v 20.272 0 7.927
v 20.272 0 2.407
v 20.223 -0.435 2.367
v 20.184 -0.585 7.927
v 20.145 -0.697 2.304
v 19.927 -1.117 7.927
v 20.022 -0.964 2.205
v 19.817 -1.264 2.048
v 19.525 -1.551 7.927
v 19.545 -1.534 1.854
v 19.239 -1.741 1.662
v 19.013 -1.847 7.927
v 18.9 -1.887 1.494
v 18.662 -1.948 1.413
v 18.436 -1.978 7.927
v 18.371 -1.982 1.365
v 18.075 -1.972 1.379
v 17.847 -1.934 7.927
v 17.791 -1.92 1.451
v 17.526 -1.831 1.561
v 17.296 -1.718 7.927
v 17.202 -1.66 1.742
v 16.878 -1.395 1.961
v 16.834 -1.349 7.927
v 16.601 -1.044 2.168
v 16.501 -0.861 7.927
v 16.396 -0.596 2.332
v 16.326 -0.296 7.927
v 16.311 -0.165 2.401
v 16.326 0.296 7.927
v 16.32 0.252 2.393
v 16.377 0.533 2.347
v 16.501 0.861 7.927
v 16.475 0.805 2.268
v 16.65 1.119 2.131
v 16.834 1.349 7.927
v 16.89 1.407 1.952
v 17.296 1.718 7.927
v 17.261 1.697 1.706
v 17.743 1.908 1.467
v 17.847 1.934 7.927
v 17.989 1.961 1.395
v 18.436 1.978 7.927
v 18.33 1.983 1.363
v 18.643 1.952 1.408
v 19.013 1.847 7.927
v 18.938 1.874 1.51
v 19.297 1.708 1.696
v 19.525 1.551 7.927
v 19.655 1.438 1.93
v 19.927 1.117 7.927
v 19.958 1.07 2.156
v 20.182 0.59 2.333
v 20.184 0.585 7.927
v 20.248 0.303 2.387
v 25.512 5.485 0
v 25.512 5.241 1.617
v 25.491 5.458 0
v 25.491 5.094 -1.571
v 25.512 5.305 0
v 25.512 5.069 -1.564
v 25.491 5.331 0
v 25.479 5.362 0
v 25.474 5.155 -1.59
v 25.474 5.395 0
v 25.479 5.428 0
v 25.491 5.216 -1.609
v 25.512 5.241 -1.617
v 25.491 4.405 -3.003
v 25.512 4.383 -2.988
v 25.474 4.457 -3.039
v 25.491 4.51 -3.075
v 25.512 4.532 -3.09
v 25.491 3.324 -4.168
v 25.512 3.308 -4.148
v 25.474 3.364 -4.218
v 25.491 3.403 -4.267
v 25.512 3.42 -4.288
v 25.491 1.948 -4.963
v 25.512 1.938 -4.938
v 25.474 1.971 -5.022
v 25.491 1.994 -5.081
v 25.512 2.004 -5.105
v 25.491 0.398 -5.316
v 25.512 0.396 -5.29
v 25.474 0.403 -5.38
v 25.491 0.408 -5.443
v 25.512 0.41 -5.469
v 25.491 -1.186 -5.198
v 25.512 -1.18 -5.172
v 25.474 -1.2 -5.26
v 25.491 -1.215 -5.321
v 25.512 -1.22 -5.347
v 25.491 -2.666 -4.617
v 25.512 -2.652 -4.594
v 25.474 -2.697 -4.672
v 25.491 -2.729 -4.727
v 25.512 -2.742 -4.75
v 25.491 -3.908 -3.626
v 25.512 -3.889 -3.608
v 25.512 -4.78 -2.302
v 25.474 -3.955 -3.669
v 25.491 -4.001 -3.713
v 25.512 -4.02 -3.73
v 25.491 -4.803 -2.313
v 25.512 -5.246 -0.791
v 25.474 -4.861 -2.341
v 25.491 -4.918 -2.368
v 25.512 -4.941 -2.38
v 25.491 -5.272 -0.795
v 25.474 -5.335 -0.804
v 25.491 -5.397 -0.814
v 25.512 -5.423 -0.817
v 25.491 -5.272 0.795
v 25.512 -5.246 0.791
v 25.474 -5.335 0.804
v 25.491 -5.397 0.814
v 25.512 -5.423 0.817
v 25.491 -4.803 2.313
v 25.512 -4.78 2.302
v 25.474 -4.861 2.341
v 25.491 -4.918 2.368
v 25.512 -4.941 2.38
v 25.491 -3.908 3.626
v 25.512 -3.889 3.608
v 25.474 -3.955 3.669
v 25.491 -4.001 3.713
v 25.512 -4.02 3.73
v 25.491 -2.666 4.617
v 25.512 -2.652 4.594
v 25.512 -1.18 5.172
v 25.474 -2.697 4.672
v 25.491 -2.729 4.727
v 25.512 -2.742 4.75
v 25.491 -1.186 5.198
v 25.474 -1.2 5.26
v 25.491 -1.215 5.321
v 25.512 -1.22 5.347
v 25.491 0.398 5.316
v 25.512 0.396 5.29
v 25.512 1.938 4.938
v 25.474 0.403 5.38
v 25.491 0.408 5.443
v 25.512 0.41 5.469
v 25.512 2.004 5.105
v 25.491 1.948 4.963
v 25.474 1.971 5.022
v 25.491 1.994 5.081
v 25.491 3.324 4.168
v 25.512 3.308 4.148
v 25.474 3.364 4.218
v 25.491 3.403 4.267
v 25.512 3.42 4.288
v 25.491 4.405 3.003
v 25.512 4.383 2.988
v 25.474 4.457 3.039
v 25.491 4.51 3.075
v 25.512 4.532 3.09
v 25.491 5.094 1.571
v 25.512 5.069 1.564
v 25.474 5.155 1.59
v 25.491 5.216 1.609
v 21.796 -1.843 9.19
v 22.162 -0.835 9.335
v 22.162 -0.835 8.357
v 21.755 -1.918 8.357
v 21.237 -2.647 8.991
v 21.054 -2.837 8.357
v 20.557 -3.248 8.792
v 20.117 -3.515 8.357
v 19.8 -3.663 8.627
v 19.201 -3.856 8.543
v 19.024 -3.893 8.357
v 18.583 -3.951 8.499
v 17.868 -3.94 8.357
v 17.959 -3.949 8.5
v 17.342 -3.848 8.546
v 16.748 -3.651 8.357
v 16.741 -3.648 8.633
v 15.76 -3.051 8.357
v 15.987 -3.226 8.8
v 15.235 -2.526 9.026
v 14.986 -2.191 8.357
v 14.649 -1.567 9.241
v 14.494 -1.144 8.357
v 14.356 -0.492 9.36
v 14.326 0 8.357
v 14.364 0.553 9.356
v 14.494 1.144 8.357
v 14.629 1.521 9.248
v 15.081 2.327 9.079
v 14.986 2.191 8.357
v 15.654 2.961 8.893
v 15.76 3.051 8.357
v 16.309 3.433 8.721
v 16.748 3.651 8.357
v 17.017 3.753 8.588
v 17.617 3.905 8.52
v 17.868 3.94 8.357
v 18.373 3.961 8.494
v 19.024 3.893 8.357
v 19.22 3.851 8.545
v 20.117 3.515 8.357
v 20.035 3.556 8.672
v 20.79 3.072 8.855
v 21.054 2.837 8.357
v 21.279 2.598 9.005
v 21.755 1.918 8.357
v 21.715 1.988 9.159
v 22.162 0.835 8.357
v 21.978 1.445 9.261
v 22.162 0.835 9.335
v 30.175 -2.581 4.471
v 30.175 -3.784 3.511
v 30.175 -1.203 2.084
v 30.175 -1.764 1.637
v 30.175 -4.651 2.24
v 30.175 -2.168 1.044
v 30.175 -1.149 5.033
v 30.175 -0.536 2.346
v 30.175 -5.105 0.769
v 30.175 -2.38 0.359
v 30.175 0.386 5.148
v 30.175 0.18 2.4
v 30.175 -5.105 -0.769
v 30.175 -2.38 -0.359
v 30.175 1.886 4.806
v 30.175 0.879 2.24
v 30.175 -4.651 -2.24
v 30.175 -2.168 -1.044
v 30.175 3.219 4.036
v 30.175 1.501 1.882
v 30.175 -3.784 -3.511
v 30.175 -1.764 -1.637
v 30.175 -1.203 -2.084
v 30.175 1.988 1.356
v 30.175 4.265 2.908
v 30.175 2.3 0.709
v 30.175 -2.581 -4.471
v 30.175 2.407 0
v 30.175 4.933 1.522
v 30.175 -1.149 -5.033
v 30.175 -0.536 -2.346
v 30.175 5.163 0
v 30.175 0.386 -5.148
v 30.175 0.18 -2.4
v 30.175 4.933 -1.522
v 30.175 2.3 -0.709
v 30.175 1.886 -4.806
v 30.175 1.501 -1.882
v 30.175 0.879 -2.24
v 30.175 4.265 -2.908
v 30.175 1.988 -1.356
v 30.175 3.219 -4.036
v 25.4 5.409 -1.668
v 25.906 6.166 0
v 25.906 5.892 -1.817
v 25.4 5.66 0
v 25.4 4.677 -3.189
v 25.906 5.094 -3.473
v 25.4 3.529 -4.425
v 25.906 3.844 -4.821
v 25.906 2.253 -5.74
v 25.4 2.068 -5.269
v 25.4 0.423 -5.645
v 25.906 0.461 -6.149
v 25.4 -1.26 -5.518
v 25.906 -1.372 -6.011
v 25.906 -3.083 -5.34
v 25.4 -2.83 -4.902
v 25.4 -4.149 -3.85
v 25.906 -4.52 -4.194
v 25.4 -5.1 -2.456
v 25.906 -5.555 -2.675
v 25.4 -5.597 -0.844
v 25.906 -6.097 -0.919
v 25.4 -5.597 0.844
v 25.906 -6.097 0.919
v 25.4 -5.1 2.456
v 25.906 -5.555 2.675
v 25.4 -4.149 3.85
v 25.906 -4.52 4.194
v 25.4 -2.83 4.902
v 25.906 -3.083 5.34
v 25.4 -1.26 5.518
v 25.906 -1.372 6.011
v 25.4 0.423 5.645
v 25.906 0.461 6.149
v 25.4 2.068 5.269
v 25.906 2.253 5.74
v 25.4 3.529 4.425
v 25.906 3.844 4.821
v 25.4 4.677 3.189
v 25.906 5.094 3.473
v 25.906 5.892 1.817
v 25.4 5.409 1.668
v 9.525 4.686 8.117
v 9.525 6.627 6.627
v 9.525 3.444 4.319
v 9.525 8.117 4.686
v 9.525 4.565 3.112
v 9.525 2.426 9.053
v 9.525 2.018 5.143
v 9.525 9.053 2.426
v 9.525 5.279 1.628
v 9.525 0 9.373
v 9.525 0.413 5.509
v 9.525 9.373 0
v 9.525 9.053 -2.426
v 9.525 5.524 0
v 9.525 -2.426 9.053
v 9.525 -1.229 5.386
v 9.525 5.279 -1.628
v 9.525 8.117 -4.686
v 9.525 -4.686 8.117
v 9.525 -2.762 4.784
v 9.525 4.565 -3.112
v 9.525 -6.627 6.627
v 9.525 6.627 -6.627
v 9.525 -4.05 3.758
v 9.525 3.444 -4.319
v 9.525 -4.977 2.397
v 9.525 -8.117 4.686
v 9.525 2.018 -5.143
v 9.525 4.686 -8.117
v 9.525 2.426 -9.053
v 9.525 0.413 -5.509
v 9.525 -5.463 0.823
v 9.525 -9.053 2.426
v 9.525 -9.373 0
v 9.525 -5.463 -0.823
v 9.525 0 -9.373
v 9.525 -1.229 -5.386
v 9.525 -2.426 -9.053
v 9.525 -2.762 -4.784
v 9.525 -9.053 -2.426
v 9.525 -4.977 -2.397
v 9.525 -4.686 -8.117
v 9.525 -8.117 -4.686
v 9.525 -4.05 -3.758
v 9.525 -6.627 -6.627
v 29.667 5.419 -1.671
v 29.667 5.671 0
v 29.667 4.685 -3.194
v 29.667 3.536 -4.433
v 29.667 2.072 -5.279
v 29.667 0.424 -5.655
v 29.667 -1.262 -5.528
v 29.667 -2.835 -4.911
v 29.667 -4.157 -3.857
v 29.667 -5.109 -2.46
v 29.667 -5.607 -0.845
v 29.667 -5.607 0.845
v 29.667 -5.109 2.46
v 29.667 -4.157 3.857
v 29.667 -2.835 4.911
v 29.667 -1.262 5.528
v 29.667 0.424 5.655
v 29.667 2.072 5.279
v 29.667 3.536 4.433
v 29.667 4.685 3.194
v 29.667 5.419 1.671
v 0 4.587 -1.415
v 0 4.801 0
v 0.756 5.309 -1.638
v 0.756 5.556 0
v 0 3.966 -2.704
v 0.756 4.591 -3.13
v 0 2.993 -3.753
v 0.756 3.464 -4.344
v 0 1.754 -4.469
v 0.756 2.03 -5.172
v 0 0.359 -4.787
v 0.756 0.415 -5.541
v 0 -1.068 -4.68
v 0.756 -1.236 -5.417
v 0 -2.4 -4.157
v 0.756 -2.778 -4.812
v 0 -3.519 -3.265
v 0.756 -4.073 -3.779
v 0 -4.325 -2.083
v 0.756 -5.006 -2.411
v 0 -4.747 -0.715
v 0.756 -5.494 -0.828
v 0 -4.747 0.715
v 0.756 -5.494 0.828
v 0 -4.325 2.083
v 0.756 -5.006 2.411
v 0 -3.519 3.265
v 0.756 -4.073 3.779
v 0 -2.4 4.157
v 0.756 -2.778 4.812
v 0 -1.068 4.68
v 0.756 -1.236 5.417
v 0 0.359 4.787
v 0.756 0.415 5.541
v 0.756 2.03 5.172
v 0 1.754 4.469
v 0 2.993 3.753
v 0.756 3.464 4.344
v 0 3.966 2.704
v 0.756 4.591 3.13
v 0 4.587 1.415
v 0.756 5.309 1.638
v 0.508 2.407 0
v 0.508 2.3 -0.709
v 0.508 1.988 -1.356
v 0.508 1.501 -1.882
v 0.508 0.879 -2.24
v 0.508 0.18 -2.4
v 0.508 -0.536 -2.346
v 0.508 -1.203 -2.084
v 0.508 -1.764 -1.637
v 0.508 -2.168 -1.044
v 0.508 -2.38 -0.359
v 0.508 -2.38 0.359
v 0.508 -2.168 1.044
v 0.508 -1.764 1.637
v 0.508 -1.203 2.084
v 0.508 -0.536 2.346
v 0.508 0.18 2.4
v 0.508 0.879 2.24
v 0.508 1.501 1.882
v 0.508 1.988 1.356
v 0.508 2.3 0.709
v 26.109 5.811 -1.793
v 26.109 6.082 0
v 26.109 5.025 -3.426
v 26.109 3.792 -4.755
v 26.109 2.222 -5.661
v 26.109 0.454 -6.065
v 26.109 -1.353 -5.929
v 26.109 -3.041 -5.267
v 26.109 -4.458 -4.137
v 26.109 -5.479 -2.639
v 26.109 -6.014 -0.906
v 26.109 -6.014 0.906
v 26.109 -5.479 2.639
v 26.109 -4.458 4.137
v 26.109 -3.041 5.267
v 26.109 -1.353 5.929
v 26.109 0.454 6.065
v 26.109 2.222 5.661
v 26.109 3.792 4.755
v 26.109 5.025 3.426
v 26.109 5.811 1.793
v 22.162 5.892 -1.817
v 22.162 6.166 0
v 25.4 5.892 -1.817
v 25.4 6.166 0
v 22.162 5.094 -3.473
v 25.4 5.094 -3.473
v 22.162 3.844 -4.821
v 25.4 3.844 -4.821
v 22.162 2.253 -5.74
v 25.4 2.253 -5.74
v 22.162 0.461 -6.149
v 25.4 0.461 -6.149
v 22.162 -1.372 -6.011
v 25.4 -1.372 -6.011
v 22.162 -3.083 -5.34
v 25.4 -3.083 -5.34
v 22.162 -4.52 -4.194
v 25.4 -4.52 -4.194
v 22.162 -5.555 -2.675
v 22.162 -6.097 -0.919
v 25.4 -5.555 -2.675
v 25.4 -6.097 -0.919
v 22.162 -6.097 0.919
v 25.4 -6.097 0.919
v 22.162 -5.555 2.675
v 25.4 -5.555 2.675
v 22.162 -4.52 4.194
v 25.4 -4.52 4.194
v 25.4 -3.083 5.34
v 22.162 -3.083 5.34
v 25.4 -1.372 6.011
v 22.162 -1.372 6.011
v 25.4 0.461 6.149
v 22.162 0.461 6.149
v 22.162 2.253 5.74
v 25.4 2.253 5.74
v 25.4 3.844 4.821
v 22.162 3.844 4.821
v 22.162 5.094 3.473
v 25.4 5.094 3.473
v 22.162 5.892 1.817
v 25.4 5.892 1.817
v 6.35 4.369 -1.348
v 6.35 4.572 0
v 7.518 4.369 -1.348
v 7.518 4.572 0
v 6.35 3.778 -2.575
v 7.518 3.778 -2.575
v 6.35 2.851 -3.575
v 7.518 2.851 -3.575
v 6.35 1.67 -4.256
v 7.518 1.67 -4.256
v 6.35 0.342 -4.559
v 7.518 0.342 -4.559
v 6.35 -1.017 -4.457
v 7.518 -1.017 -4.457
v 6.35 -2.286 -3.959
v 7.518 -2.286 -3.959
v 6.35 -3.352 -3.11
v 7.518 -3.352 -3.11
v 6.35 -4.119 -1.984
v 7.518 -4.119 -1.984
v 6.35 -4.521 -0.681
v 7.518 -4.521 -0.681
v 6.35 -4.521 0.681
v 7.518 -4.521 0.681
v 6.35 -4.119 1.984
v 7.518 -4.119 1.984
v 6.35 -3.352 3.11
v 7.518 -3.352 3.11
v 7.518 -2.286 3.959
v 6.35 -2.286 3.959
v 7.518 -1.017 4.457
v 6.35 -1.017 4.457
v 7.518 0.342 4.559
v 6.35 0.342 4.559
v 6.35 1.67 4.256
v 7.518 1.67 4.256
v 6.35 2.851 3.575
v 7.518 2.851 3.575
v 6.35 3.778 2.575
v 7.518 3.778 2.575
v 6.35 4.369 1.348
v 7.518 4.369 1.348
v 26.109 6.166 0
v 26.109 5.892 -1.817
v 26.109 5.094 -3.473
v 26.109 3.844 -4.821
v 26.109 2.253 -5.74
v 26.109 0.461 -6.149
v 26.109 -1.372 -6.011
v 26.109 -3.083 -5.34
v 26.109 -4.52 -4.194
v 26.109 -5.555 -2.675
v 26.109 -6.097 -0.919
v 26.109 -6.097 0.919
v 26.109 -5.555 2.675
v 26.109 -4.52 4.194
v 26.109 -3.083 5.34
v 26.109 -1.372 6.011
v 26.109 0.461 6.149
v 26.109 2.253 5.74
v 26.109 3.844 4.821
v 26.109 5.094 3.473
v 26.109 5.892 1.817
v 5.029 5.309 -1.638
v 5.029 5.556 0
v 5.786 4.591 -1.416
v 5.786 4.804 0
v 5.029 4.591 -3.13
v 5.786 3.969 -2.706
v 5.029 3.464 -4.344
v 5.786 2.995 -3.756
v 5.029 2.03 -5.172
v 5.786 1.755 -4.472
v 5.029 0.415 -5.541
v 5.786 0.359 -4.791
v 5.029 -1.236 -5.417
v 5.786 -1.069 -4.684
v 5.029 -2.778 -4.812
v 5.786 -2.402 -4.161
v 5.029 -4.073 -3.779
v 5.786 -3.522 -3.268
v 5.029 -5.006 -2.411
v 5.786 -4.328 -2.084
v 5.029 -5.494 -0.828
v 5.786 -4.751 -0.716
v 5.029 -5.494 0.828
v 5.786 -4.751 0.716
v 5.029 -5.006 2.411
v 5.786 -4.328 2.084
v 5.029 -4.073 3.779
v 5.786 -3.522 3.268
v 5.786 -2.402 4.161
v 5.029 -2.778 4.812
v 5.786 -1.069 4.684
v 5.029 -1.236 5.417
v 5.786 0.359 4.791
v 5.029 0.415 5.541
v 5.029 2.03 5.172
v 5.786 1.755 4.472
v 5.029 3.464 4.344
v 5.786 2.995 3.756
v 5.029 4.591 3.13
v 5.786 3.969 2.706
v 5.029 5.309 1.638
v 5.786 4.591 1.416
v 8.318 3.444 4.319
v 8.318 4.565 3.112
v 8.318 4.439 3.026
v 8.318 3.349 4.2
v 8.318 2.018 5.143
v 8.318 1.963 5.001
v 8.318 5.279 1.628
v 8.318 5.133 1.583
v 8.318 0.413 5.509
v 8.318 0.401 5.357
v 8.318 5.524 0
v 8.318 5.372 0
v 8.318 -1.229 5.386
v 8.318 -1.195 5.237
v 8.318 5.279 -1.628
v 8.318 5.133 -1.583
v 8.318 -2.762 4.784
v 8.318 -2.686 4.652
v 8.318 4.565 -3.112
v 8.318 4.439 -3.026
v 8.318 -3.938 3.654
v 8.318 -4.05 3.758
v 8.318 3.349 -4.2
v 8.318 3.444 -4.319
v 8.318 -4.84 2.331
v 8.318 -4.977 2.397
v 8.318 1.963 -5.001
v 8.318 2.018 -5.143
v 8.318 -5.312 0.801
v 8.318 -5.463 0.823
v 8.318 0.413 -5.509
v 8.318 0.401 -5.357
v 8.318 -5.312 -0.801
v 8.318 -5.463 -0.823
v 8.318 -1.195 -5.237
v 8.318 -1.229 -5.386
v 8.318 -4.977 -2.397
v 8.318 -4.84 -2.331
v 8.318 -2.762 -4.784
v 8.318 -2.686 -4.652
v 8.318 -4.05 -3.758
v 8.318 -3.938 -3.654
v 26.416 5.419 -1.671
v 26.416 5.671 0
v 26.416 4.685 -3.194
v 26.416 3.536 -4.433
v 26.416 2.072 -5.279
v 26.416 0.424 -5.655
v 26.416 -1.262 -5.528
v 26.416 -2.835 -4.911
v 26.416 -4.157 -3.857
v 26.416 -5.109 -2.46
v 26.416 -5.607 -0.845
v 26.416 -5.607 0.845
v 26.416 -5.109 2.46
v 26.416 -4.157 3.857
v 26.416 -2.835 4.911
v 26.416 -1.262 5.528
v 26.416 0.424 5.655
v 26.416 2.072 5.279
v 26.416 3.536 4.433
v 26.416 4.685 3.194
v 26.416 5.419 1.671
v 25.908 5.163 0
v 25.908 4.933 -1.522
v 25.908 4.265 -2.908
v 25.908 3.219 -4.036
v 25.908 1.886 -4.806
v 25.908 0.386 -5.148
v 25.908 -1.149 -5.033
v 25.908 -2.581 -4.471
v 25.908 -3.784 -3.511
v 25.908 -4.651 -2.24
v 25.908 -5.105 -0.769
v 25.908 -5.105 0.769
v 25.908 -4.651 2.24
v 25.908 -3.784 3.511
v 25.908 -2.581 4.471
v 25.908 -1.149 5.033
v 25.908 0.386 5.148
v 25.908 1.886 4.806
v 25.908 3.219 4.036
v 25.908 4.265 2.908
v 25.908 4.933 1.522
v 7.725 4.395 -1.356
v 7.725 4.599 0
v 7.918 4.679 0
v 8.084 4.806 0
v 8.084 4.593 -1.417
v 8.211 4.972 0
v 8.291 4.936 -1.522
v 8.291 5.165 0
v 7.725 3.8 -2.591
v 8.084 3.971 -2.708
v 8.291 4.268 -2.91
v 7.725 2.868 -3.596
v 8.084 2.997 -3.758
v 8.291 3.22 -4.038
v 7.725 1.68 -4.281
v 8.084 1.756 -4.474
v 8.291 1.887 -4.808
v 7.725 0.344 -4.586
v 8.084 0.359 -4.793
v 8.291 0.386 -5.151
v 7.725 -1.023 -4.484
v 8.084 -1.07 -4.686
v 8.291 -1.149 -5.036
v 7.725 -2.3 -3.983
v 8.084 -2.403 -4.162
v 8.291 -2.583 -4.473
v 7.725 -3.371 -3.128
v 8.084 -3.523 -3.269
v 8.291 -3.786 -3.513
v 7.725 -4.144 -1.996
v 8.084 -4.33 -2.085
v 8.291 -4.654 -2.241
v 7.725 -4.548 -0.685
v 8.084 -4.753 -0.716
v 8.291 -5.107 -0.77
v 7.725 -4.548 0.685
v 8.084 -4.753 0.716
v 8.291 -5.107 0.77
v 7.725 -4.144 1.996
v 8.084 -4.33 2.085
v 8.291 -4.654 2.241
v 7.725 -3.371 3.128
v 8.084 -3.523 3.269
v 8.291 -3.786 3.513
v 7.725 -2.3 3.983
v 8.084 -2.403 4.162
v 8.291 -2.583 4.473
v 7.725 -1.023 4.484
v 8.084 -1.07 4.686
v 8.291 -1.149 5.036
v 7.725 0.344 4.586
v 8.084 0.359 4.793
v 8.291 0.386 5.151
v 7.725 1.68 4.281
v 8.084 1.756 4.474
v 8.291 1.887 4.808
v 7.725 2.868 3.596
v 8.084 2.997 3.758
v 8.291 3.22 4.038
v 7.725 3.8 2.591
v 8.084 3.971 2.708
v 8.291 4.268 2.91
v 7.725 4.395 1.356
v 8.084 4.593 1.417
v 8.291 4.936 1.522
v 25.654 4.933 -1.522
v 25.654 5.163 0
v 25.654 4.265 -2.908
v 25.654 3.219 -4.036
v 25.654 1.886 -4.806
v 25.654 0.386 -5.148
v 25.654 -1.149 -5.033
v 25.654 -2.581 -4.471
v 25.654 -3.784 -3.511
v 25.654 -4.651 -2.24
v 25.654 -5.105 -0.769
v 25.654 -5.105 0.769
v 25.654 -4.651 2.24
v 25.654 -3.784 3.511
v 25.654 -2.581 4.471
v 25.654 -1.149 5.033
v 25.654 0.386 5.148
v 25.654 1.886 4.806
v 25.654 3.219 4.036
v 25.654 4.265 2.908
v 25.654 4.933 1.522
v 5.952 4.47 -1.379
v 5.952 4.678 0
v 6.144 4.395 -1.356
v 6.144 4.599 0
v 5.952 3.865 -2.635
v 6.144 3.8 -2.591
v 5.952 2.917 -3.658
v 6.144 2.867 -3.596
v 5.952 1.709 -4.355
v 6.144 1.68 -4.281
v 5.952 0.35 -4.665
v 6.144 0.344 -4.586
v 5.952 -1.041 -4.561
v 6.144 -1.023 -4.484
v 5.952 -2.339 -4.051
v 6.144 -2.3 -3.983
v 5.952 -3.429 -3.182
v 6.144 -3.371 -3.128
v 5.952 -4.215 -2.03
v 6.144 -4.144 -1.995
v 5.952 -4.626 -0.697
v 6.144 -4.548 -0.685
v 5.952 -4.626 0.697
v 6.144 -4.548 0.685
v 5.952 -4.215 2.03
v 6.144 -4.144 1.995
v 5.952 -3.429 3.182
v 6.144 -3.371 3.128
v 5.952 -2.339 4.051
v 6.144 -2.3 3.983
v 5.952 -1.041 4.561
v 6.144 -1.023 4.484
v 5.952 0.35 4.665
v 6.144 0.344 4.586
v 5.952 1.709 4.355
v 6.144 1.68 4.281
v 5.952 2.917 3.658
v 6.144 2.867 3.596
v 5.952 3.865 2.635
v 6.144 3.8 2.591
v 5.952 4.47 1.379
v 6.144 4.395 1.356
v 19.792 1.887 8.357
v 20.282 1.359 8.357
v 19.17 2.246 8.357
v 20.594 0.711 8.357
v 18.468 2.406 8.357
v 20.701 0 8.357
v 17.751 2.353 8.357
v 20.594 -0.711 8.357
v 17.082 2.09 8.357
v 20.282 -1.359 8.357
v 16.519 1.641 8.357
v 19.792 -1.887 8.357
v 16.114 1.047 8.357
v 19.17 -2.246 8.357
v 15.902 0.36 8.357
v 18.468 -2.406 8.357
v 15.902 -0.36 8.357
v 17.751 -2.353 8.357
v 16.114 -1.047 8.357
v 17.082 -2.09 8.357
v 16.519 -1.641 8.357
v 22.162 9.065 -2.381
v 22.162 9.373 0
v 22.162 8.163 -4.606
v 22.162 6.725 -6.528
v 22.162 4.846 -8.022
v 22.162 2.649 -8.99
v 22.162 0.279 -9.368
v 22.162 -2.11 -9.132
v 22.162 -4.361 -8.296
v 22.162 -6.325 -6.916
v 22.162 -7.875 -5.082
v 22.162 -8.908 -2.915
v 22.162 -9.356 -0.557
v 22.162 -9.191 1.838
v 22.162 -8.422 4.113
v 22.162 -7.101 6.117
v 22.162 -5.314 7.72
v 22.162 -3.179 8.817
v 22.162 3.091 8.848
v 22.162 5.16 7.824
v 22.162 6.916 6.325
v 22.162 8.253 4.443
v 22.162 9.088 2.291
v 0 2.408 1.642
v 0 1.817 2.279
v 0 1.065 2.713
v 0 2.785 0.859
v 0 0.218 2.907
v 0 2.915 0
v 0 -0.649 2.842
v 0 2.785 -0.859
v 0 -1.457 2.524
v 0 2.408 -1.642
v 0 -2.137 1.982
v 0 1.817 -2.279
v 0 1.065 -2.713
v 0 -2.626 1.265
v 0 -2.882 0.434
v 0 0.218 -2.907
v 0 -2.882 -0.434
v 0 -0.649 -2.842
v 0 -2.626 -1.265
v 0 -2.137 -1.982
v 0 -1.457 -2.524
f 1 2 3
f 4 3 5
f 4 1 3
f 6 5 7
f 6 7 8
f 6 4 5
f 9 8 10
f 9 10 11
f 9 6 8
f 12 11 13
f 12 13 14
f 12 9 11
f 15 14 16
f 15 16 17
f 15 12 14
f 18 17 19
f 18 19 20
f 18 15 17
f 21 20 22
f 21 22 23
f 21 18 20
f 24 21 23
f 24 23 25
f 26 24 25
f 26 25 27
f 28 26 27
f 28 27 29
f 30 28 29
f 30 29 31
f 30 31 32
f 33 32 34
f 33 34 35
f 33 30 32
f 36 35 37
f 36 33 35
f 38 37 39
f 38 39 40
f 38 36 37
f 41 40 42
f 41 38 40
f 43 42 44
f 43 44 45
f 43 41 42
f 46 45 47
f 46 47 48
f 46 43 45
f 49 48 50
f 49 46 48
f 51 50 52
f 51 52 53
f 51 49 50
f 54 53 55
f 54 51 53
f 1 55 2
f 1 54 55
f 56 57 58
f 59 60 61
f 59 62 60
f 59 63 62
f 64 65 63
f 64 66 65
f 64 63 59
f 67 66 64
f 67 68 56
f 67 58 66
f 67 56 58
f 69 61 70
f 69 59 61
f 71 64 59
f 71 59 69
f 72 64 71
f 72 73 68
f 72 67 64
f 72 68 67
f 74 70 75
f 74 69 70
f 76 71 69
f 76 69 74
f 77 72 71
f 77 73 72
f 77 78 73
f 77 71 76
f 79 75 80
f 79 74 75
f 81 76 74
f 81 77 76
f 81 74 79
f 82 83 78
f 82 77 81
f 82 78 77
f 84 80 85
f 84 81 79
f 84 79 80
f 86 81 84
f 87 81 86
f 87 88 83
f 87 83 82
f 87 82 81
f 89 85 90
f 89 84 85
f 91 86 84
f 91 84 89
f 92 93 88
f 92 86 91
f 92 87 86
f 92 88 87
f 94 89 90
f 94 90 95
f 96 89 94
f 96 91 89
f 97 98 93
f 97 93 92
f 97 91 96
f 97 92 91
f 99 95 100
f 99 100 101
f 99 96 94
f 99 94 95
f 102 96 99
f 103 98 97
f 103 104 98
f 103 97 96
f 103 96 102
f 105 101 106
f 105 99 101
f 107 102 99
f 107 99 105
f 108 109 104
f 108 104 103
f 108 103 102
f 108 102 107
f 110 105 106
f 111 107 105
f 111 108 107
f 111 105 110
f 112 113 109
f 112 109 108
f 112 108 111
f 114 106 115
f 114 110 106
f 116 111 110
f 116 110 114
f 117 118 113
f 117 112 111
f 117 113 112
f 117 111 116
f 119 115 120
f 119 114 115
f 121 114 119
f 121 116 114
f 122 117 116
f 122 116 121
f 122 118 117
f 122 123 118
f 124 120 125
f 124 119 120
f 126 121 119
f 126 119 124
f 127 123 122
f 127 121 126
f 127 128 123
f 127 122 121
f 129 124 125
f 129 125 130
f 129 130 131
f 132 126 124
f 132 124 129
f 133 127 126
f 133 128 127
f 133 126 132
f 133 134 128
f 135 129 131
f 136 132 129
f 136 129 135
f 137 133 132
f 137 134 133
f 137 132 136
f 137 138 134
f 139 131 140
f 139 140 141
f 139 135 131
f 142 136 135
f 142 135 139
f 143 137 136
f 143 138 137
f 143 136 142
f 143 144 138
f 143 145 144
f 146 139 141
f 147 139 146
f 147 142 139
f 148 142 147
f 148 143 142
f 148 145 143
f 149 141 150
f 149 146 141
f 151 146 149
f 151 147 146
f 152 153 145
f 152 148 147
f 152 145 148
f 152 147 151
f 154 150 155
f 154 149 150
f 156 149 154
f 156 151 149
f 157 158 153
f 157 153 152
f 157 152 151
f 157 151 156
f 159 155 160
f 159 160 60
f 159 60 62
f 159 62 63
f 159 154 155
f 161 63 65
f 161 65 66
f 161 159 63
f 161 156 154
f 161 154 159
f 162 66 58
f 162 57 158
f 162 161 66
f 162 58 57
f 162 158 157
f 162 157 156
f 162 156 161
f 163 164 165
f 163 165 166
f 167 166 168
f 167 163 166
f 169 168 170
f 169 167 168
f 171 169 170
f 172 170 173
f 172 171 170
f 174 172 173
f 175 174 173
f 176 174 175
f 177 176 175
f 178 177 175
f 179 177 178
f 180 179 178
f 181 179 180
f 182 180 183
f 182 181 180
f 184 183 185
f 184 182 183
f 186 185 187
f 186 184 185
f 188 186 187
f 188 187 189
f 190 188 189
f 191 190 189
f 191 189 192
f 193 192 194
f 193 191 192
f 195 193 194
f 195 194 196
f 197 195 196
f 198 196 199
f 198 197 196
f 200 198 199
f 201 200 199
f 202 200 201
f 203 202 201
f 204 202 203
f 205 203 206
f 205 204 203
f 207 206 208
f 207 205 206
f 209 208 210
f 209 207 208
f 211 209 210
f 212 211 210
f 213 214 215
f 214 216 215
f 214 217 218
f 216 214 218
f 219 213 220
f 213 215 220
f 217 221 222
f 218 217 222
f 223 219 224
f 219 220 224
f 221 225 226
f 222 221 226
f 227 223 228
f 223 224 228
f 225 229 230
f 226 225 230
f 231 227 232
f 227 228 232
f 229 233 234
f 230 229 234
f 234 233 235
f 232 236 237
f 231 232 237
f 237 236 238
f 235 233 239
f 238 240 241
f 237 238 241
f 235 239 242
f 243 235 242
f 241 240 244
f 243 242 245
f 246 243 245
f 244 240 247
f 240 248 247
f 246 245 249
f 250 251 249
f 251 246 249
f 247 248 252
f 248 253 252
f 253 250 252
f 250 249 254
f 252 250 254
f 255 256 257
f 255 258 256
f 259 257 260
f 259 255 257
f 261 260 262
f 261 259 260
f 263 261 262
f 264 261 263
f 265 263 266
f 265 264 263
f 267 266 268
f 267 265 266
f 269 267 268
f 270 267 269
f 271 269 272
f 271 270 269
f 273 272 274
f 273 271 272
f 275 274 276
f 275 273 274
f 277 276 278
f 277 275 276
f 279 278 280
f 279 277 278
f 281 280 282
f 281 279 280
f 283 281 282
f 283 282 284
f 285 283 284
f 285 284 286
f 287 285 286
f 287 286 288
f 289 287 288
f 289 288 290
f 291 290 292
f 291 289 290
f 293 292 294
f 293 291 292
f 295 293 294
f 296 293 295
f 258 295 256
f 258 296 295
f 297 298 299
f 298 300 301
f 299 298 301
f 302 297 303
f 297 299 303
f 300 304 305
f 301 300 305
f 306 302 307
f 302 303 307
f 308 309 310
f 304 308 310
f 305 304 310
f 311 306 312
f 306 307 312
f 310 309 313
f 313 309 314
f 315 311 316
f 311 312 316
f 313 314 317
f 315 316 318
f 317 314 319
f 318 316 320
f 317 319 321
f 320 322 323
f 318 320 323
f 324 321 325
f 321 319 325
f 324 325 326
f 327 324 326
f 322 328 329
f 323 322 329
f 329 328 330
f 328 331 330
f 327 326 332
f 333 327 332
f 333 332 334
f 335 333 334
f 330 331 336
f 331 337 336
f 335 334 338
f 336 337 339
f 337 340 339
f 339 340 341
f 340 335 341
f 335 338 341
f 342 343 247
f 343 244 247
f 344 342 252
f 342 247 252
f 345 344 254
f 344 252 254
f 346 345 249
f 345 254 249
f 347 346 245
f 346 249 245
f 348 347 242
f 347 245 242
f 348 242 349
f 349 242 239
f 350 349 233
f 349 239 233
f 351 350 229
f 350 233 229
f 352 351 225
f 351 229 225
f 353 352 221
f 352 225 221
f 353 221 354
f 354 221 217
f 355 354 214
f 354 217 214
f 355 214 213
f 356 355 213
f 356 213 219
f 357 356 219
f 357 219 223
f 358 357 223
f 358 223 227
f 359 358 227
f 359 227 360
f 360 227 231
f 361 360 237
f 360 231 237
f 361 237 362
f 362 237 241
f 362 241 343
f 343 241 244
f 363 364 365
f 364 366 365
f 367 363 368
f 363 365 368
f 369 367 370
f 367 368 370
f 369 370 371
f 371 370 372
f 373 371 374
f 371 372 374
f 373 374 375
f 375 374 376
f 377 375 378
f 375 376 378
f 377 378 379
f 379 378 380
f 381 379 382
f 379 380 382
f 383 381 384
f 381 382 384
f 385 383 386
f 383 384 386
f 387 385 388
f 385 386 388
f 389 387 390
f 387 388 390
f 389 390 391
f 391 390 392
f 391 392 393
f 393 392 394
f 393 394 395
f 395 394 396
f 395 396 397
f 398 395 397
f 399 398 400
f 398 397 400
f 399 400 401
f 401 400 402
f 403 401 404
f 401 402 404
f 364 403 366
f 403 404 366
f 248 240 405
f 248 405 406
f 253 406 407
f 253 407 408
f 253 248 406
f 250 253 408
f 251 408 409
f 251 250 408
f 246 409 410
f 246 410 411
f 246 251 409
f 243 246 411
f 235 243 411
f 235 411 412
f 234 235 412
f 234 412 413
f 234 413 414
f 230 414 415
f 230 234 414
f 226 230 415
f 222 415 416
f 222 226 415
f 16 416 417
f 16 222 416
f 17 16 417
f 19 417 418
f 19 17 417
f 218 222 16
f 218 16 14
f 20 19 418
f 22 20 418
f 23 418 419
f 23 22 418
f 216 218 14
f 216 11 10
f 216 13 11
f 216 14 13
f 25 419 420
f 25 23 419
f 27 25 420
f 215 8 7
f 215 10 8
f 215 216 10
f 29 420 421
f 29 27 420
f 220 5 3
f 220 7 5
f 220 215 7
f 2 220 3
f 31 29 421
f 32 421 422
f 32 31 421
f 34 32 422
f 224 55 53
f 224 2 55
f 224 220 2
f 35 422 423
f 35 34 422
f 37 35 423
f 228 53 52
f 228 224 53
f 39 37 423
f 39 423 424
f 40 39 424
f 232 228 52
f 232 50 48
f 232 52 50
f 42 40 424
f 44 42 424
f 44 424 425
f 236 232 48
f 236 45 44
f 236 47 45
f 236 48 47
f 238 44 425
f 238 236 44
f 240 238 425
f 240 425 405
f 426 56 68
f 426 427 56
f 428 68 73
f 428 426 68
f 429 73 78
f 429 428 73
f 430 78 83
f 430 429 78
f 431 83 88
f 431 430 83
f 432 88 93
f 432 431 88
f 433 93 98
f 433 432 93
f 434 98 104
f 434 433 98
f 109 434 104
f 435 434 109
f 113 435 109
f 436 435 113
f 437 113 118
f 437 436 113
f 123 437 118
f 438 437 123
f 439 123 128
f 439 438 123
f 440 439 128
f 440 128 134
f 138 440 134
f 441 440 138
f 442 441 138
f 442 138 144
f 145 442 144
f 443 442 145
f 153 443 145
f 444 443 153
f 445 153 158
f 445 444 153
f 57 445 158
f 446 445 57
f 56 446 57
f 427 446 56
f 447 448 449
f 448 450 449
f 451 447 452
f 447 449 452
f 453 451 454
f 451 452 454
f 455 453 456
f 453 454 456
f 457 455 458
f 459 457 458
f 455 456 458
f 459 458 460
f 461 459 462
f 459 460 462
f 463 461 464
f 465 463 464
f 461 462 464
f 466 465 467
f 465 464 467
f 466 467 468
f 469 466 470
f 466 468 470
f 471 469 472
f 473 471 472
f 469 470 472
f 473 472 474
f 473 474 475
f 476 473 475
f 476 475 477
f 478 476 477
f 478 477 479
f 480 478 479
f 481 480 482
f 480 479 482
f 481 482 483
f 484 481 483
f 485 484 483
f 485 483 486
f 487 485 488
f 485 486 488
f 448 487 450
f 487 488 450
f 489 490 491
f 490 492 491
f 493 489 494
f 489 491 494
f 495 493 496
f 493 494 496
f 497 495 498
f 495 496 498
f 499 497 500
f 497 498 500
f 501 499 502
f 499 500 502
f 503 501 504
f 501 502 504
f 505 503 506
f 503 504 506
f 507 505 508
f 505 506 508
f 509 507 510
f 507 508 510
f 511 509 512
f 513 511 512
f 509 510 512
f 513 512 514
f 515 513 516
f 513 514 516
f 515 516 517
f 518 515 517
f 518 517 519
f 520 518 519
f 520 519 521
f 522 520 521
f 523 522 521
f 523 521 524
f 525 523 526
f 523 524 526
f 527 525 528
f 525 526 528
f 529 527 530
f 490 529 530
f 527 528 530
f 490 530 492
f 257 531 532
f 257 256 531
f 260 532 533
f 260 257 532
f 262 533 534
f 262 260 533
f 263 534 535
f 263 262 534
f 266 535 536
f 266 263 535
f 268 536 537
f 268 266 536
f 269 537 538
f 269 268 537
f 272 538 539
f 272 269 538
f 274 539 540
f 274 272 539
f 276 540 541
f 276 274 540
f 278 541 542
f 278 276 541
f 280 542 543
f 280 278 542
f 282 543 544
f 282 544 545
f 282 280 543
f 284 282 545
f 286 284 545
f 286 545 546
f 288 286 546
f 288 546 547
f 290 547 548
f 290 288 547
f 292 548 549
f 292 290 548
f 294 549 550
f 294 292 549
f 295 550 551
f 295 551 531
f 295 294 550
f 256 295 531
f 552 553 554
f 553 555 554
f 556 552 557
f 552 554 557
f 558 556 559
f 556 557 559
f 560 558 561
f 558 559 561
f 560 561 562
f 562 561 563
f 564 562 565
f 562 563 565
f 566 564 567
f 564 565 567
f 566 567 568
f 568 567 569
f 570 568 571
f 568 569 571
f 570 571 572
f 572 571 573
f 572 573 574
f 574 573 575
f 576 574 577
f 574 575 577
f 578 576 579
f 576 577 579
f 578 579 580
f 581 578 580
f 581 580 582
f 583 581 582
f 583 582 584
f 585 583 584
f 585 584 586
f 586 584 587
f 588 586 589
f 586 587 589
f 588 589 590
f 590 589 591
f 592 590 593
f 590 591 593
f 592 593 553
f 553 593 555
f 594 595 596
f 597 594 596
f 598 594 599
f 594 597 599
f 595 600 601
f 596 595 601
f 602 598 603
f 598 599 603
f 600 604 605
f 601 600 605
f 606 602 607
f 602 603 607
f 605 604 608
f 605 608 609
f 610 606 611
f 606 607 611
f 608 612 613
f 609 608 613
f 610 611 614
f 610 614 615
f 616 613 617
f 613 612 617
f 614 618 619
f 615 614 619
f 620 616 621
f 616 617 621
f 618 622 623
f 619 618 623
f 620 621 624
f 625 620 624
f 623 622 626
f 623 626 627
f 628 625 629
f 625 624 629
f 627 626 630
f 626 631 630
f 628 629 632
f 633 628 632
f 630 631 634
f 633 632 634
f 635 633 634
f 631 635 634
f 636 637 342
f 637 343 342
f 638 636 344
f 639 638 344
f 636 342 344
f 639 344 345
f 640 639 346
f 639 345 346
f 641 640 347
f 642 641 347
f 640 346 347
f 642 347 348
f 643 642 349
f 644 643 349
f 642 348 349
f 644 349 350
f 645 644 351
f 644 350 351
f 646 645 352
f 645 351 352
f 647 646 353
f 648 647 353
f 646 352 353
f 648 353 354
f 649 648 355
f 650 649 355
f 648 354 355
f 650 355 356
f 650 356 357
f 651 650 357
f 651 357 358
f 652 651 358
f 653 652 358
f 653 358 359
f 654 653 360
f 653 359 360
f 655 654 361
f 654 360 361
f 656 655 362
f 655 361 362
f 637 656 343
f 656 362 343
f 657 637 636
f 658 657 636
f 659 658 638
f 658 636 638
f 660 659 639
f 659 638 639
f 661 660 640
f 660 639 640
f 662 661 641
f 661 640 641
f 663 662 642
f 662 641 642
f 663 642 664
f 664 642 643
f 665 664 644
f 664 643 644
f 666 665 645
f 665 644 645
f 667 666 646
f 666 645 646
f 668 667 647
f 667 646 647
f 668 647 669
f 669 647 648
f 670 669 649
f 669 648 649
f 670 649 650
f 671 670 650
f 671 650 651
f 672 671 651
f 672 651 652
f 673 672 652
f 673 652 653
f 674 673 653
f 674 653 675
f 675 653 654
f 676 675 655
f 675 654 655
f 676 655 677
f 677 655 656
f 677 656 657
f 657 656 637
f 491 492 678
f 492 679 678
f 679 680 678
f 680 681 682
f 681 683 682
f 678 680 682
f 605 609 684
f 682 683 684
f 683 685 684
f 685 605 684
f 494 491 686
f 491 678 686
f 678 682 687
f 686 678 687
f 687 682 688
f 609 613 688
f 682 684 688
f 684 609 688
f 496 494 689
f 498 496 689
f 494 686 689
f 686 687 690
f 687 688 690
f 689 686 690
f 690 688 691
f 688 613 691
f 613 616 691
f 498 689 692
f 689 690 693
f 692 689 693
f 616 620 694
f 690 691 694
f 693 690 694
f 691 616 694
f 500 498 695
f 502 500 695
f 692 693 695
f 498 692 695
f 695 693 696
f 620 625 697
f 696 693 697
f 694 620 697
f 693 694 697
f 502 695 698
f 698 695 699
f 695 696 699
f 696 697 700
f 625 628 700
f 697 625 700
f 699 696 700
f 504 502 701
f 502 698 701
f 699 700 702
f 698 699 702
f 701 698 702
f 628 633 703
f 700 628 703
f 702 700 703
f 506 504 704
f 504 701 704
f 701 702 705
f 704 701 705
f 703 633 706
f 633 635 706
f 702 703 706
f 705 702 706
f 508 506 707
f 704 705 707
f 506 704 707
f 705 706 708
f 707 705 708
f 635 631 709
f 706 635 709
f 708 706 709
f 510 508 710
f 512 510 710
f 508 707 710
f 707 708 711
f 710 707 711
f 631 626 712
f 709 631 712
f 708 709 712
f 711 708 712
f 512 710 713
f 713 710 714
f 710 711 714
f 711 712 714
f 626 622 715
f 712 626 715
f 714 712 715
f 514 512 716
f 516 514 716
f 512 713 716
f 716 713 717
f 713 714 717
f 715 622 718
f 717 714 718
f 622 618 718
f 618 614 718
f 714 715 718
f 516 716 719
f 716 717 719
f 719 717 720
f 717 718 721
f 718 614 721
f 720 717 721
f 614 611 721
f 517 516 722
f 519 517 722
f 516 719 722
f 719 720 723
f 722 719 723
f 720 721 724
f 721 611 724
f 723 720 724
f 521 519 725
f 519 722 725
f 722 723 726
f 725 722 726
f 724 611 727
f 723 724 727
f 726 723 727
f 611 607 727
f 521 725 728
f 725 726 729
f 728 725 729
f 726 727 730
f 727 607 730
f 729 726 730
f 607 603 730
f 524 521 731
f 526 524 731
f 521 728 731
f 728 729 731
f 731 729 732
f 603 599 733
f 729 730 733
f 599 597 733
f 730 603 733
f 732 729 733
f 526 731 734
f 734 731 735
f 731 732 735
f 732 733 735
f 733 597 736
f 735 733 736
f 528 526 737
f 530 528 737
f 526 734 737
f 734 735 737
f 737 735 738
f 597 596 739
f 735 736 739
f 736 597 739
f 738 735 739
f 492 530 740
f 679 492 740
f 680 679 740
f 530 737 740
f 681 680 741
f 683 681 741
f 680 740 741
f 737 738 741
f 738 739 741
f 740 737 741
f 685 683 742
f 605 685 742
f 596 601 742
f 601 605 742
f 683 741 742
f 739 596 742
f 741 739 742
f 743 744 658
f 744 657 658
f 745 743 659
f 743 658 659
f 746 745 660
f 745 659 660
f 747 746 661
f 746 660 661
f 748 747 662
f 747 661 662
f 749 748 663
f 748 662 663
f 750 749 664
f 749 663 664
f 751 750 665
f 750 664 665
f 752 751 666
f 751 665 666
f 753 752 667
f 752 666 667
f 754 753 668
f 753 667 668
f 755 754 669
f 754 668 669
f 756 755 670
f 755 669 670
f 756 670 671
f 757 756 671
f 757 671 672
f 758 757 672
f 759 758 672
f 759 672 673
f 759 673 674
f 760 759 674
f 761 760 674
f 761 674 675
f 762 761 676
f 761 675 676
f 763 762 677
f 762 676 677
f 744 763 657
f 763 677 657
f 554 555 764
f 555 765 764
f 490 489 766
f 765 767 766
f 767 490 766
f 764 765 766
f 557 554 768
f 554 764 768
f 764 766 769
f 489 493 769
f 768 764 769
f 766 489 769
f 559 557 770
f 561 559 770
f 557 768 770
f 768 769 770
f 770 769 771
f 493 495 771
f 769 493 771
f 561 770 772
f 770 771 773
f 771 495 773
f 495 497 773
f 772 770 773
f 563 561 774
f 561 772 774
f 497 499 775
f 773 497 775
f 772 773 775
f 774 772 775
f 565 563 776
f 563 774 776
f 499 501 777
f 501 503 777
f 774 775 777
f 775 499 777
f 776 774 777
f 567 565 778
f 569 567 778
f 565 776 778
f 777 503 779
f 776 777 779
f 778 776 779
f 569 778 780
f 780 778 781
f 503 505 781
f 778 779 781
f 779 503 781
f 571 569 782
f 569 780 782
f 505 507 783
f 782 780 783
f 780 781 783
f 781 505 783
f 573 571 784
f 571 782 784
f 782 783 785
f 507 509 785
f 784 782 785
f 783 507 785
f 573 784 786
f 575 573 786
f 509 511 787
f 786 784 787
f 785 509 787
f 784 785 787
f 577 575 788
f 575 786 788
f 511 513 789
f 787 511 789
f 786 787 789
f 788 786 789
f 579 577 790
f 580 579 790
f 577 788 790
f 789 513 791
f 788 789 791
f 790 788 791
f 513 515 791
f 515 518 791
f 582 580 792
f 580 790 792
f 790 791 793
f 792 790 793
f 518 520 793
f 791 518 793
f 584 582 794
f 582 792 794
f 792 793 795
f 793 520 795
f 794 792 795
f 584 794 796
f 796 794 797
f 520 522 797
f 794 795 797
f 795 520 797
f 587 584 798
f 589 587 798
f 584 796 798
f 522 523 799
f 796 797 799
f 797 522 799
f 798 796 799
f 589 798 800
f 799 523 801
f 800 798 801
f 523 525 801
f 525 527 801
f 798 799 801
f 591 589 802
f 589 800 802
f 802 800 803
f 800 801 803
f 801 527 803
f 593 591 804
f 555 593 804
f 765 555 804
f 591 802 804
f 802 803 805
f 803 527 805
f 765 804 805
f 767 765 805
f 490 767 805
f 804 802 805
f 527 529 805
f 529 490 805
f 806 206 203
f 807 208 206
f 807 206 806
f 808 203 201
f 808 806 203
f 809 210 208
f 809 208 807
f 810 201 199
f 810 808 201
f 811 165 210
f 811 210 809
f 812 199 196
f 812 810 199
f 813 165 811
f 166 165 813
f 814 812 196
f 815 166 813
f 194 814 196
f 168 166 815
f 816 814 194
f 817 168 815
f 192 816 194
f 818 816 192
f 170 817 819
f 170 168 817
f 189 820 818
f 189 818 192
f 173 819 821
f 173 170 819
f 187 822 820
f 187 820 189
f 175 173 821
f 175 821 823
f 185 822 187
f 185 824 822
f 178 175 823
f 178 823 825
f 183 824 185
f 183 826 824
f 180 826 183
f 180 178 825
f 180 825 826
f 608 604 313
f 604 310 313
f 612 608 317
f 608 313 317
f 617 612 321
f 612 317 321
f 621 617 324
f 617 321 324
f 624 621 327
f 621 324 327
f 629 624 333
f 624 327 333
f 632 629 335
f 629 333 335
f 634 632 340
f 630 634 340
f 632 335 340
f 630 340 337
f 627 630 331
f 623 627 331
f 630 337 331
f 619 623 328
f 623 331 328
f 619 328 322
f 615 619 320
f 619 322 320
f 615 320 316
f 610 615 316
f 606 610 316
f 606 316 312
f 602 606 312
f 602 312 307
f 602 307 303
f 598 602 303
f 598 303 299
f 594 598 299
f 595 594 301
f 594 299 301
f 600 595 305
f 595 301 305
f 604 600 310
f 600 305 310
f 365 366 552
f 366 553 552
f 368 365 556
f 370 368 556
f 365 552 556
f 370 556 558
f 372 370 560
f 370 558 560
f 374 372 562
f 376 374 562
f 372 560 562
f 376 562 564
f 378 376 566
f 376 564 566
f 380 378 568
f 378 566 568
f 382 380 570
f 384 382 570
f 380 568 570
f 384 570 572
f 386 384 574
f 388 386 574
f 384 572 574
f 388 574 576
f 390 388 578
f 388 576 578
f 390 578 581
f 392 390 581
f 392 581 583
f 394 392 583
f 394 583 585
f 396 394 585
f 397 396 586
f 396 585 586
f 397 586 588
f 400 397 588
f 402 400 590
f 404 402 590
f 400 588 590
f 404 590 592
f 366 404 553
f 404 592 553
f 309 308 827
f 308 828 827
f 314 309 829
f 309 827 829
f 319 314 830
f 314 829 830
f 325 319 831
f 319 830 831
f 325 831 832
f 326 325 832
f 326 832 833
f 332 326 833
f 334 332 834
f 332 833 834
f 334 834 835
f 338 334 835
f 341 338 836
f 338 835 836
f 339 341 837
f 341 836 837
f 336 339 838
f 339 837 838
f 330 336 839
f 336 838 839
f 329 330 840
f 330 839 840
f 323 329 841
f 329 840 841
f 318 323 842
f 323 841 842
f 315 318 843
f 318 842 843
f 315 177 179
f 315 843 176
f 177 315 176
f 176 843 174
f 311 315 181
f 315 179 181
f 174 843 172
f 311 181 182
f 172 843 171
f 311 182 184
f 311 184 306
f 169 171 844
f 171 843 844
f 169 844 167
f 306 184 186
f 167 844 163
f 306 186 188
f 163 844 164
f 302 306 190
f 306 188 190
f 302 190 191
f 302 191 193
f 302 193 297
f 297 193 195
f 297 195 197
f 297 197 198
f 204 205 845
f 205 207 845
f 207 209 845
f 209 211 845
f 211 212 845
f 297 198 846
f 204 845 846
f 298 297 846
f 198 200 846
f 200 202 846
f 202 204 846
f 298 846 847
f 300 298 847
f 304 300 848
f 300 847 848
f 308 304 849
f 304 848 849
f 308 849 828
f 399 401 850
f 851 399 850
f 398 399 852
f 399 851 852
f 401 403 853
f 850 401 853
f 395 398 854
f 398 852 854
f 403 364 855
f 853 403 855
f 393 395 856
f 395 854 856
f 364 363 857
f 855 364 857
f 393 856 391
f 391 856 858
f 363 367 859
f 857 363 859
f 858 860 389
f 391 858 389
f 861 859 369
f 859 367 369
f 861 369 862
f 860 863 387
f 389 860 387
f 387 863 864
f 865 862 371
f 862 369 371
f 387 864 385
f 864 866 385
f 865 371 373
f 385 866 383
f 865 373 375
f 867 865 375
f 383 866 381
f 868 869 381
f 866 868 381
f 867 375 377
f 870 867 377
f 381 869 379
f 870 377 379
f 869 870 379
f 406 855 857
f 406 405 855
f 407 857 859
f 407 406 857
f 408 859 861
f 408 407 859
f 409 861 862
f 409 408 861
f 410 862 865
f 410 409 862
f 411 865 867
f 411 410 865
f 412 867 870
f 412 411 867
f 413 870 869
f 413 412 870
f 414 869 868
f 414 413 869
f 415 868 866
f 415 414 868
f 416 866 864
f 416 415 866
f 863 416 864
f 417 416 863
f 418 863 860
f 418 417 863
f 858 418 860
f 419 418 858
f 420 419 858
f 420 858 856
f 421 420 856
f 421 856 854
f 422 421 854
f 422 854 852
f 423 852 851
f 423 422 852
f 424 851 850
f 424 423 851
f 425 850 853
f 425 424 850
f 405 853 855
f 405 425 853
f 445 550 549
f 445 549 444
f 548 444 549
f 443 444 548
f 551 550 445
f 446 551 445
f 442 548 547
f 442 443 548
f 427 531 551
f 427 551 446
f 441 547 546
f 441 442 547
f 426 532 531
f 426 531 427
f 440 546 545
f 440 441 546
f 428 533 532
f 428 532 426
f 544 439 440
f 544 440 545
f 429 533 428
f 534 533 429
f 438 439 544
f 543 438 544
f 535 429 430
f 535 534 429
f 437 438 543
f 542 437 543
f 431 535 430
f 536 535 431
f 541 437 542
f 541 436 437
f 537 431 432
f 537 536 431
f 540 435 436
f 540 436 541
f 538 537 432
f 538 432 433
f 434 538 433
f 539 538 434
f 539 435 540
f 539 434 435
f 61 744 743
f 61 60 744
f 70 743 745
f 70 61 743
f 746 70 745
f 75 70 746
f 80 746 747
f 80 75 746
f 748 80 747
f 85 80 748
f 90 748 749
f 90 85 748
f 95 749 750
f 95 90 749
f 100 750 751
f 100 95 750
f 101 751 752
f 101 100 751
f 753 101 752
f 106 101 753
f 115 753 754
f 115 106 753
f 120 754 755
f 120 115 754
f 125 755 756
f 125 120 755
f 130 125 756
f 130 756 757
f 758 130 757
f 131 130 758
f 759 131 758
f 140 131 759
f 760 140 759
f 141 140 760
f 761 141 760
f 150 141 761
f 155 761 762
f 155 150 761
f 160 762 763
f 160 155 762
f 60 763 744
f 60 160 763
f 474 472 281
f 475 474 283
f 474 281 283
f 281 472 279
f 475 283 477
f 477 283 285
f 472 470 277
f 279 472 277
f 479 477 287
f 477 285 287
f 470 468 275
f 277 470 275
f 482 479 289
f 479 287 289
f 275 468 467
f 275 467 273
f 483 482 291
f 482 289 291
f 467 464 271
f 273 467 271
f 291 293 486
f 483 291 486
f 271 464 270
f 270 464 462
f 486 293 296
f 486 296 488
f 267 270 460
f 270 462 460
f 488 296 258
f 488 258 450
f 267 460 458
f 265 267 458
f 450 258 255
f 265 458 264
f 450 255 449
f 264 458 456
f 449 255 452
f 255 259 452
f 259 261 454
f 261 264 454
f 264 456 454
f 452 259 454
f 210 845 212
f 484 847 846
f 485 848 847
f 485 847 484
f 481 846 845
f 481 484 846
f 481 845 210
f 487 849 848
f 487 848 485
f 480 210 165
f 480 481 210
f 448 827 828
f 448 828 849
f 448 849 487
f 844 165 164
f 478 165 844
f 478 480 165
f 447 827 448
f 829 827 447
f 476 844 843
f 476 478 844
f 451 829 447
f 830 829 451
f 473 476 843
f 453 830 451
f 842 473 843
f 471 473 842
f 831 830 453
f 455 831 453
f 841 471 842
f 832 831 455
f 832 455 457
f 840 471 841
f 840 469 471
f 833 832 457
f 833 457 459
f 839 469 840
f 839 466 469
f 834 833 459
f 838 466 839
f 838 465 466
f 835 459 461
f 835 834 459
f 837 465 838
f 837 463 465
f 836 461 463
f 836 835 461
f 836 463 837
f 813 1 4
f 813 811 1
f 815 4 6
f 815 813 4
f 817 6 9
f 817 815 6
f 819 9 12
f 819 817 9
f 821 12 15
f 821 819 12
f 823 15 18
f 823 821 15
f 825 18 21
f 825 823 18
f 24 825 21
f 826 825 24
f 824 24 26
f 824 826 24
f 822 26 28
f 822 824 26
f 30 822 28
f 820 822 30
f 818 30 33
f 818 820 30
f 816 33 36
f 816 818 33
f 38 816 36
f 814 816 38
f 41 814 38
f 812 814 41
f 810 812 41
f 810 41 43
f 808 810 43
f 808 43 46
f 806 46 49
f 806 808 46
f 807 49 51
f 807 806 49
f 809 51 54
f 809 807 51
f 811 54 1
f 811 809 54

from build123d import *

# Parameters (mm, degrees)
SKETCH5_W = 3.2385
SKETCH5_H = 3.81


with BuildPart() as part:
    # Sketch1 → Revolve1 (revolve)
    with BuildSketch(Plane.XY):
        with BuildLine():
            Line((0, 0), (0, 4.8006))
            Line((0, 4.8006), (0.75565, 5.55625))
            Line((0.75565, 5.55625), (5.028593864, 5.55625))
            Line((5.028593864, 5.55625), (5.786403291, 4.804192648))
            ThreePointArc((5.786403291, 4.804192648), (6.045223575, 4.6323221), (6.35, 4.572))
            Line((6.35, 4.572), (7.5184, 4.572))
            ThreePointArc((7.5184, 4.572), (8.084156136, 4.806343864), (8.3185, 5.3721))
            Line((8.3185, 5.3721), (8.3185, 5.5245))
            Line((8.3185, 5.5245), (9.525, 5.5245))
            Line((9.525, 5.5245), (9.525, 0))
            Line((9.525, 0), (0, 0))
        make_face()
    revolve(axis=Axis((9.525, 0, 0), (-1, 0, 0)))

    # Sketch2 → Revolve2 (revolve)
    with BuildSketch(Plane.XY):
        Polygon((9.525, 0), (9.525, 9.3726), (25.4, 9.3726), (25.4, 5.16255), (25.908, 5.16255), (26.416, 5.67055), (29.6672, 5.67055), (30.1752, 5.16255), (30.1752, 0), align=None)
    revolve(axis=Axis((30.1752, 0, 0), (-1, 0, 0)))

    # Sketch3 → Cut-Revolve1 (revolve, cut)
    with BuildSketch(Plane.XY):
        Polygon((0, 0), (0, 2.91465), (0.508, 2.40665), (30.1752, 2.40665), (30.1752, 0), align=None)
    revolve(axis=Axis((30.1752, 0, 0), (-1, 0, 0)), mode=Mode.SUBTRACT)

    # Sketch4 → Cut-Revolve2 (revolve, cut)
    with BuildSketch(Plane(origin=(0, 0, 0), x_dir=(1, 0, 0), z_dir=(0, 1, 0))):
        Polygon((18.288, 1.016), (20.27174, 1.016), (20.27174, -7.92734), (20.701, -8.3566), (22.2504, -8.3566), (22.2504, -9.3726), (18.288, -9.3726), align=None)
    revolve(axis=Axis((18.288, 0, 9.3726), (0, 0, -1)), mode=Mode.SUBTRACT)

    # Sketch5 → Cut-Revolve3 (revolve, cut)
    with BuildSketch(Plane.XY):
        with Locations((23.78075, 8.07085)):
            Rectangle(SKETCH5_W, SKETCH5_H)
    revolve(axis=Axis((25.4, 0, 0), (-1, 0, 0)), mode=Mode.SUBTRACT)

    # Sketch6 → Revolve3 (revolve)
    with BuildSketch(Plane.XY):
        with BuildLine():
            Line((25.4, 5.660338686), (25.4, 4.90855))
            Line((25.4, 4.90855), (25.908, 4.90855))
            Line((25.908, 4.90855), (25.908, 5.16255))
            Line((25.908, 5.16255), (25.654, 5.16255))
            Line((25.654, 5.16255), (25.511592316, 5.304957684))
            ThreePointArc((25.511592316, 5.304957684), (25.474394878, 5.394760245), (25.511592316, 5.484562806))
            Line((25.511592316, 5.484562806), (26.108711314, 6.081681804))
            Line((26.108711314, 6.081681804), (26.108711314, 6.16585))
            Line((26.108711314, 6.16585), (25.905511314, 6.16585))
            Line((25.905511314, 6.16585), (25.4, 5.660338686))
        make_face()
    revolve(axis=Axis((25.908, 0, 0), (-1, 0, 0)))


solid = part.part
